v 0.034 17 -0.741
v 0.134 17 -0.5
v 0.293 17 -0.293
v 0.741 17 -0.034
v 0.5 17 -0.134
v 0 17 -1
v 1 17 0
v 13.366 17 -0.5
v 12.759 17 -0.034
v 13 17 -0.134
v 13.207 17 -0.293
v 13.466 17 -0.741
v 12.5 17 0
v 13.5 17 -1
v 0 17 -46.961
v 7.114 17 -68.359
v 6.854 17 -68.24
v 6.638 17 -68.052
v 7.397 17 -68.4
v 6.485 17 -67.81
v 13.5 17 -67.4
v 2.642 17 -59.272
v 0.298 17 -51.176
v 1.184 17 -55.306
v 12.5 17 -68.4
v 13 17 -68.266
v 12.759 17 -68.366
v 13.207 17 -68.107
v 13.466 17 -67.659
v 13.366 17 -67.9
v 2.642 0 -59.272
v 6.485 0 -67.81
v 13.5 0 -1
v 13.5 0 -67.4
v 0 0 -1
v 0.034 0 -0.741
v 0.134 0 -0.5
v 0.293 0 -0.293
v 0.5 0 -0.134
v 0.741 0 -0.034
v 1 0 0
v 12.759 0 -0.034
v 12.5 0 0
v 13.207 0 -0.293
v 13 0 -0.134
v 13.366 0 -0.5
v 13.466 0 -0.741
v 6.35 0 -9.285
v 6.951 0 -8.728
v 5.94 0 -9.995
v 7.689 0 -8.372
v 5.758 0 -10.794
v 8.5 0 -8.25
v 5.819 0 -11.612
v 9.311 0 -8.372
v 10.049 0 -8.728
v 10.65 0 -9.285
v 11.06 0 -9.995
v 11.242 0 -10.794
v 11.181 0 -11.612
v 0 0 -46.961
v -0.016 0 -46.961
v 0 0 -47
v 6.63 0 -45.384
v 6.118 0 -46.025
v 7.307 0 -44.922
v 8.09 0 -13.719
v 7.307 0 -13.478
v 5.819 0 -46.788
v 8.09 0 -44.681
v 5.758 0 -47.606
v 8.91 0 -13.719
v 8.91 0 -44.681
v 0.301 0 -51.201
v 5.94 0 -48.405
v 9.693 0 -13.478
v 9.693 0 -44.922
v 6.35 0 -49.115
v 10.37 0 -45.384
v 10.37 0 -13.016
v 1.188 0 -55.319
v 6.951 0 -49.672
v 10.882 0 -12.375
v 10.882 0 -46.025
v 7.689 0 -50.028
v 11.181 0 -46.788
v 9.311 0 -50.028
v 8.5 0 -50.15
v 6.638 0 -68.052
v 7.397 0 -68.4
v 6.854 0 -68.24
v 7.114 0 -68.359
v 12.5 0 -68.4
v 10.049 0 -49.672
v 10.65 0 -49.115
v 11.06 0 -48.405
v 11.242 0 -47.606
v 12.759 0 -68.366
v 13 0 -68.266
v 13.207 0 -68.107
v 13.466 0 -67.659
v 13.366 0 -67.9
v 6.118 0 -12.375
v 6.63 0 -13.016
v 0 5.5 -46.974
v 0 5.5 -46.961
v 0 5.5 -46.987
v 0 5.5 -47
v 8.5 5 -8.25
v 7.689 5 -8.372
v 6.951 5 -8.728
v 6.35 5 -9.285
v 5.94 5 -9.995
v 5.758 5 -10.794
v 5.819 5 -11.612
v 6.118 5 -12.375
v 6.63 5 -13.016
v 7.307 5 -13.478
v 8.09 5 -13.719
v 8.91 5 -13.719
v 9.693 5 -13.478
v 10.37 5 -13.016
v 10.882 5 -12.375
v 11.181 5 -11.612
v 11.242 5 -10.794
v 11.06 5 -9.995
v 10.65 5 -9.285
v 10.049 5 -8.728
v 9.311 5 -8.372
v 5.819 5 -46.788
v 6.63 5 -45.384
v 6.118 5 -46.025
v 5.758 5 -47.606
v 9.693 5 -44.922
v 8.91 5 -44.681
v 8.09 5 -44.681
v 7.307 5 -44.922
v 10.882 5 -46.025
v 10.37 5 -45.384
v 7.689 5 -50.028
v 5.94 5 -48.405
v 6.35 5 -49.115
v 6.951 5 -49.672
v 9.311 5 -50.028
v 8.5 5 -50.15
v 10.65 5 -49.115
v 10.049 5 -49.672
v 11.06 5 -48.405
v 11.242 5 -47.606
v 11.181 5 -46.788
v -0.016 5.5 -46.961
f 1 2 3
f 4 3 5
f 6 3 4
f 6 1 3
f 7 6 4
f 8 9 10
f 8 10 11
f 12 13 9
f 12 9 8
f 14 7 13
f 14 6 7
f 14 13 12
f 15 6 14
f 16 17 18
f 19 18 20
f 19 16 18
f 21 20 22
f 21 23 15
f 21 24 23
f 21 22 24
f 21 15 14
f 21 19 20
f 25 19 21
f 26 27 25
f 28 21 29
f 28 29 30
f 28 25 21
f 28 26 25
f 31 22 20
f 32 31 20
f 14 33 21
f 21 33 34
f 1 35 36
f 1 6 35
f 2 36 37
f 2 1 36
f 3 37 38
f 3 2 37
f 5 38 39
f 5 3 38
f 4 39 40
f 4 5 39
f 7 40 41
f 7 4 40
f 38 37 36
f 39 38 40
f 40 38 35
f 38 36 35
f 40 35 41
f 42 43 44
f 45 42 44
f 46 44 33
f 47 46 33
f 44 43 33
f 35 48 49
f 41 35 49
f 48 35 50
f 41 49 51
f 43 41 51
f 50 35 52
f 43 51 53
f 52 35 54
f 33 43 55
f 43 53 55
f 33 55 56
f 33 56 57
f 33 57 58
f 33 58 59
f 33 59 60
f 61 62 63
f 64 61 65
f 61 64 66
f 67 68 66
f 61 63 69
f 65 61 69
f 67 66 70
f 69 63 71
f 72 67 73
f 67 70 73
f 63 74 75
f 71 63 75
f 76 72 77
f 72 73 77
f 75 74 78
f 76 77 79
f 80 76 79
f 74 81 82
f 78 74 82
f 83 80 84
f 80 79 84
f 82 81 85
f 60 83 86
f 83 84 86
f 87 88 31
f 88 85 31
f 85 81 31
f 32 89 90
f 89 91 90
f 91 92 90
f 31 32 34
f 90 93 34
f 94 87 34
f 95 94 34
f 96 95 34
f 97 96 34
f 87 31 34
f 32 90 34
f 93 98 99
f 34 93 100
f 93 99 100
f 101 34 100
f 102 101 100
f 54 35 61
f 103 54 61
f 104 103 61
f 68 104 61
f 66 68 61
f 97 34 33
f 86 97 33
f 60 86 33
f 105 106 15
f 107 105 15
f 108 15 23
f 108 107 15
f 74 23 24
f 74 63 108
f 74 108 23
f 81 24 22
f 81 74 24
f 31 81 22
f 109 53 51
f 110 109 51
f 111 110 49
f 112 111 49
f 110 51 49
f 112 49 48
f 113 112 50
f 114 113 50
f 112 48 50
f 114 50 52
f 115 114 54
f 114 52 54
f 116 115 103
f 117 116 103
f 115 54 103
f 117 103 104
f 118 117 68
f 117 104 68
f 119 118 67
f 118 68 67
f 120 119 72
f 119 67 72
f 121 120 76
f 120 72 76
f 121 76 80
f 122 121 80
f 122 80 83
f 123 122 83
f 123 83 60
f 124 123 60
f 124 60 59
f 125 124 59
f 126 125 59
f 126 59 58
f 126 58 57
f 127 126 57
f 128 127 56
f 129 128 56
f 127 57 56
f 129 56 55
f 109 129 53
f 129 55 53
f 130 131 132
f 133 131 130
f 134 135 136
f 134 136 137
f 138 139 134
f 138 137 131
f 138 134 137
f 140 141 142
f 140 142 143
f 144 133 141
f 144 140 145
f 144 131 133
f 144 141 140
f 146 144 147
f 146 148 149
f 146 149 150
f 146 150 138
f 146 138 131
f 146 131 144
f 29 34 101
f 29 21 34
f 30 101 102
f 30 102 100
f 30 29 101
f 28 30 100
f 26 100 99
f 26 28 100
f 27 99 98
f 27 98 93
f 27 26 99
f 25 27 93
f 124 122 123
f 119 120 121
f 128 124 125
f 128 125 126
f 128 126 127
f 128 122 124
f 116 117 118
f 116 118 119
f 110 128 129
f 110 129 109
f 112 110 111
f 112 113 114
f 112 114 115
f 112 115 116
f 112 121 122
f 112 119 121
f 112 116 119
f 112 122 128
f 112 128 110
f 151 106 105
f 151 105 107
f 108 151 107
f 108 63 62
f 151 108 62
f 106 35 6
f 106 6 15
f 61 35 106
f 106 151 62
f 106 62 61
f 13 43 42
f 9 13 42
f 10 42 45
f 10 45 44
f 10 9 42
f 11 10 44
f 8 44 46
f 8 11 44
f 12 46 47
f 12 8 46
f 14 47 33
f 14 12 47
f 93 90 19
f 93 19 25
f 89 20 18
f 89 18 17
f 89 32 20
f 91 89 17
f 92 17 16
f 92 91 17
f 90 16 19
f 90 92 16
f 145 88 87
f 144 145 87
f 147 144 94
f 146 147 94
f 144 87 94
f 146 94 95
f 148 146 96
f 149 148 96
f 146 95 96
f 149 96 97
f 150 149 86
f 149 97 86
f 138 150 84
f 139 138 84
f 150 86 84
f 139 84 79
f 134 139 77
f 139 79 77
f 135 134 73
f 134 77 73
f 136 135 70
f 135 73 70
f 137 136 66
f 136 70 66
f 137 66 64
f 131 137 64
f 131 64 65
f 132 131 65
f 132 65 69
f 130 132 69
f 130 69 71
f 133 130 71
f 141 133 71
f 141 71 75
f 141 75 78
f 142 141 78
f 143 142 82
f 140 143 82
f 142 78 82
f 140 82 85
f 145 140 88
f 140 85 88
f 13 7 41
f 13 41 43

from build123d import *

# Parameters (mm, degrees)
SKETCH_1_W          = 13.5
SKETCH_1_H          = 68.4
EXTRUDE_1_DEPTH     = 17
SKETCH_2_R          = 2.75
CUT_EXTRUDE_1_DEPTH = 5
CUT_EXTRUDE_2_DEPTH = 17
EXTRUDE_2_DEPTH     = 5.5
FILLET_1_R          = 30
FILLET_2_R          = 1
SKETCH_8_W          = 4
SKETCH_8_H          = 19.960959335
CUT_EXTRUDE_5_DEPTH = 17


with BuildPart() as part:
    # ｽｹｯﾁ1 → ﾎﾞｽ - 押し出し1 (new body)
    with BuildSketch(Plane(origin=(0, 0, 0), x_dir=(1, 0, 0), z_dir=(0, 1, 0))):
        with Locations((6.75, 34.2)):
            Rectangle(SKETCH_1_W, SKETCH_1_H)
    extrude(amount=EXTRUDE_1_DEPTH)

    # ｽｹｯﾁ2 → ｶｯﾄ - 押し出し1 (cut)
    with BuildSketch(Plane.XZ):
        with Locations(Location((8.5, -47.4, 0), (0, 0, 270))):
            Circle(SKETCH_2_R)
        with Locations(Location((8.5, -11, 0), (0, 0, 90))):
            Circle(SKETCH_2_R)
    extrude(amount=-CUT_EXTRUDE_1_DEPTH, mode=Mode.SUBTRACT)

    # ｽｹｯﾁ3 → ｶｯﾄ - 押し出し2 (cut)
    with BuildSketch(Plane(origin=(0, 17, 0), x_dir=(1, 0, 0), z_dir=(0, 1, 0))):
        Polygon((6.75, 68.4), (0, 68.4), (0, 53.4), align=None)
    extrude(amount=-CUT_EXTRUDE_2_DEPTH, mode=Mode.SUBTRACT)

    # ｽｹｯﾁ4 → ﾎﾞｽ - 押し出し2 (add)
    with BuildSketch(Plane.XZ):
        Polygon((0, -47), (-4, -37), (-4, -27), (0, -27), align=None)
    extrude(amount=-EXTRUDE_2_DEPTH)

    # ﾌｨﾚｯﾄ1
    fillet_1_edges = [part.edges().sort_by_distance(p)[0] for p in [
        (0, 8.5, -53.4),
    ]]
    fillet(fillet_1_edges, radius=FILLET_1_R)

    # ﾌｨﾚｯﾄ2
    fillet_2_edges = [part.edges().sort_by_distance(p)[0] for p in [
        (6.75, 8.5, -68.4),
        (13.5, 8.5, -68.4),
        (13.5, 8.5, 0),
        (0, 8.5, 0),
    ]]
    fillet(fillet_2_edges, radius=FILLET_2_R)

    # ｽｹｯﾁ8 → ｶｯﾄ - 押し出し5 (cut)
    with BuildSketch(Plane(origin=(0, 17, 0), x_dir=(1, 0, 0), z_dir=(0, 1, 0))):
        with Locations((-2, 36.980479668)):
            Rectangle(SKETCH_8_W, SKETCH_8_H)
    extrude(amount=-CUT_EXTRUDE_5_DEPTH, mode=Mode.SUBTRACT)


solid = part.part
